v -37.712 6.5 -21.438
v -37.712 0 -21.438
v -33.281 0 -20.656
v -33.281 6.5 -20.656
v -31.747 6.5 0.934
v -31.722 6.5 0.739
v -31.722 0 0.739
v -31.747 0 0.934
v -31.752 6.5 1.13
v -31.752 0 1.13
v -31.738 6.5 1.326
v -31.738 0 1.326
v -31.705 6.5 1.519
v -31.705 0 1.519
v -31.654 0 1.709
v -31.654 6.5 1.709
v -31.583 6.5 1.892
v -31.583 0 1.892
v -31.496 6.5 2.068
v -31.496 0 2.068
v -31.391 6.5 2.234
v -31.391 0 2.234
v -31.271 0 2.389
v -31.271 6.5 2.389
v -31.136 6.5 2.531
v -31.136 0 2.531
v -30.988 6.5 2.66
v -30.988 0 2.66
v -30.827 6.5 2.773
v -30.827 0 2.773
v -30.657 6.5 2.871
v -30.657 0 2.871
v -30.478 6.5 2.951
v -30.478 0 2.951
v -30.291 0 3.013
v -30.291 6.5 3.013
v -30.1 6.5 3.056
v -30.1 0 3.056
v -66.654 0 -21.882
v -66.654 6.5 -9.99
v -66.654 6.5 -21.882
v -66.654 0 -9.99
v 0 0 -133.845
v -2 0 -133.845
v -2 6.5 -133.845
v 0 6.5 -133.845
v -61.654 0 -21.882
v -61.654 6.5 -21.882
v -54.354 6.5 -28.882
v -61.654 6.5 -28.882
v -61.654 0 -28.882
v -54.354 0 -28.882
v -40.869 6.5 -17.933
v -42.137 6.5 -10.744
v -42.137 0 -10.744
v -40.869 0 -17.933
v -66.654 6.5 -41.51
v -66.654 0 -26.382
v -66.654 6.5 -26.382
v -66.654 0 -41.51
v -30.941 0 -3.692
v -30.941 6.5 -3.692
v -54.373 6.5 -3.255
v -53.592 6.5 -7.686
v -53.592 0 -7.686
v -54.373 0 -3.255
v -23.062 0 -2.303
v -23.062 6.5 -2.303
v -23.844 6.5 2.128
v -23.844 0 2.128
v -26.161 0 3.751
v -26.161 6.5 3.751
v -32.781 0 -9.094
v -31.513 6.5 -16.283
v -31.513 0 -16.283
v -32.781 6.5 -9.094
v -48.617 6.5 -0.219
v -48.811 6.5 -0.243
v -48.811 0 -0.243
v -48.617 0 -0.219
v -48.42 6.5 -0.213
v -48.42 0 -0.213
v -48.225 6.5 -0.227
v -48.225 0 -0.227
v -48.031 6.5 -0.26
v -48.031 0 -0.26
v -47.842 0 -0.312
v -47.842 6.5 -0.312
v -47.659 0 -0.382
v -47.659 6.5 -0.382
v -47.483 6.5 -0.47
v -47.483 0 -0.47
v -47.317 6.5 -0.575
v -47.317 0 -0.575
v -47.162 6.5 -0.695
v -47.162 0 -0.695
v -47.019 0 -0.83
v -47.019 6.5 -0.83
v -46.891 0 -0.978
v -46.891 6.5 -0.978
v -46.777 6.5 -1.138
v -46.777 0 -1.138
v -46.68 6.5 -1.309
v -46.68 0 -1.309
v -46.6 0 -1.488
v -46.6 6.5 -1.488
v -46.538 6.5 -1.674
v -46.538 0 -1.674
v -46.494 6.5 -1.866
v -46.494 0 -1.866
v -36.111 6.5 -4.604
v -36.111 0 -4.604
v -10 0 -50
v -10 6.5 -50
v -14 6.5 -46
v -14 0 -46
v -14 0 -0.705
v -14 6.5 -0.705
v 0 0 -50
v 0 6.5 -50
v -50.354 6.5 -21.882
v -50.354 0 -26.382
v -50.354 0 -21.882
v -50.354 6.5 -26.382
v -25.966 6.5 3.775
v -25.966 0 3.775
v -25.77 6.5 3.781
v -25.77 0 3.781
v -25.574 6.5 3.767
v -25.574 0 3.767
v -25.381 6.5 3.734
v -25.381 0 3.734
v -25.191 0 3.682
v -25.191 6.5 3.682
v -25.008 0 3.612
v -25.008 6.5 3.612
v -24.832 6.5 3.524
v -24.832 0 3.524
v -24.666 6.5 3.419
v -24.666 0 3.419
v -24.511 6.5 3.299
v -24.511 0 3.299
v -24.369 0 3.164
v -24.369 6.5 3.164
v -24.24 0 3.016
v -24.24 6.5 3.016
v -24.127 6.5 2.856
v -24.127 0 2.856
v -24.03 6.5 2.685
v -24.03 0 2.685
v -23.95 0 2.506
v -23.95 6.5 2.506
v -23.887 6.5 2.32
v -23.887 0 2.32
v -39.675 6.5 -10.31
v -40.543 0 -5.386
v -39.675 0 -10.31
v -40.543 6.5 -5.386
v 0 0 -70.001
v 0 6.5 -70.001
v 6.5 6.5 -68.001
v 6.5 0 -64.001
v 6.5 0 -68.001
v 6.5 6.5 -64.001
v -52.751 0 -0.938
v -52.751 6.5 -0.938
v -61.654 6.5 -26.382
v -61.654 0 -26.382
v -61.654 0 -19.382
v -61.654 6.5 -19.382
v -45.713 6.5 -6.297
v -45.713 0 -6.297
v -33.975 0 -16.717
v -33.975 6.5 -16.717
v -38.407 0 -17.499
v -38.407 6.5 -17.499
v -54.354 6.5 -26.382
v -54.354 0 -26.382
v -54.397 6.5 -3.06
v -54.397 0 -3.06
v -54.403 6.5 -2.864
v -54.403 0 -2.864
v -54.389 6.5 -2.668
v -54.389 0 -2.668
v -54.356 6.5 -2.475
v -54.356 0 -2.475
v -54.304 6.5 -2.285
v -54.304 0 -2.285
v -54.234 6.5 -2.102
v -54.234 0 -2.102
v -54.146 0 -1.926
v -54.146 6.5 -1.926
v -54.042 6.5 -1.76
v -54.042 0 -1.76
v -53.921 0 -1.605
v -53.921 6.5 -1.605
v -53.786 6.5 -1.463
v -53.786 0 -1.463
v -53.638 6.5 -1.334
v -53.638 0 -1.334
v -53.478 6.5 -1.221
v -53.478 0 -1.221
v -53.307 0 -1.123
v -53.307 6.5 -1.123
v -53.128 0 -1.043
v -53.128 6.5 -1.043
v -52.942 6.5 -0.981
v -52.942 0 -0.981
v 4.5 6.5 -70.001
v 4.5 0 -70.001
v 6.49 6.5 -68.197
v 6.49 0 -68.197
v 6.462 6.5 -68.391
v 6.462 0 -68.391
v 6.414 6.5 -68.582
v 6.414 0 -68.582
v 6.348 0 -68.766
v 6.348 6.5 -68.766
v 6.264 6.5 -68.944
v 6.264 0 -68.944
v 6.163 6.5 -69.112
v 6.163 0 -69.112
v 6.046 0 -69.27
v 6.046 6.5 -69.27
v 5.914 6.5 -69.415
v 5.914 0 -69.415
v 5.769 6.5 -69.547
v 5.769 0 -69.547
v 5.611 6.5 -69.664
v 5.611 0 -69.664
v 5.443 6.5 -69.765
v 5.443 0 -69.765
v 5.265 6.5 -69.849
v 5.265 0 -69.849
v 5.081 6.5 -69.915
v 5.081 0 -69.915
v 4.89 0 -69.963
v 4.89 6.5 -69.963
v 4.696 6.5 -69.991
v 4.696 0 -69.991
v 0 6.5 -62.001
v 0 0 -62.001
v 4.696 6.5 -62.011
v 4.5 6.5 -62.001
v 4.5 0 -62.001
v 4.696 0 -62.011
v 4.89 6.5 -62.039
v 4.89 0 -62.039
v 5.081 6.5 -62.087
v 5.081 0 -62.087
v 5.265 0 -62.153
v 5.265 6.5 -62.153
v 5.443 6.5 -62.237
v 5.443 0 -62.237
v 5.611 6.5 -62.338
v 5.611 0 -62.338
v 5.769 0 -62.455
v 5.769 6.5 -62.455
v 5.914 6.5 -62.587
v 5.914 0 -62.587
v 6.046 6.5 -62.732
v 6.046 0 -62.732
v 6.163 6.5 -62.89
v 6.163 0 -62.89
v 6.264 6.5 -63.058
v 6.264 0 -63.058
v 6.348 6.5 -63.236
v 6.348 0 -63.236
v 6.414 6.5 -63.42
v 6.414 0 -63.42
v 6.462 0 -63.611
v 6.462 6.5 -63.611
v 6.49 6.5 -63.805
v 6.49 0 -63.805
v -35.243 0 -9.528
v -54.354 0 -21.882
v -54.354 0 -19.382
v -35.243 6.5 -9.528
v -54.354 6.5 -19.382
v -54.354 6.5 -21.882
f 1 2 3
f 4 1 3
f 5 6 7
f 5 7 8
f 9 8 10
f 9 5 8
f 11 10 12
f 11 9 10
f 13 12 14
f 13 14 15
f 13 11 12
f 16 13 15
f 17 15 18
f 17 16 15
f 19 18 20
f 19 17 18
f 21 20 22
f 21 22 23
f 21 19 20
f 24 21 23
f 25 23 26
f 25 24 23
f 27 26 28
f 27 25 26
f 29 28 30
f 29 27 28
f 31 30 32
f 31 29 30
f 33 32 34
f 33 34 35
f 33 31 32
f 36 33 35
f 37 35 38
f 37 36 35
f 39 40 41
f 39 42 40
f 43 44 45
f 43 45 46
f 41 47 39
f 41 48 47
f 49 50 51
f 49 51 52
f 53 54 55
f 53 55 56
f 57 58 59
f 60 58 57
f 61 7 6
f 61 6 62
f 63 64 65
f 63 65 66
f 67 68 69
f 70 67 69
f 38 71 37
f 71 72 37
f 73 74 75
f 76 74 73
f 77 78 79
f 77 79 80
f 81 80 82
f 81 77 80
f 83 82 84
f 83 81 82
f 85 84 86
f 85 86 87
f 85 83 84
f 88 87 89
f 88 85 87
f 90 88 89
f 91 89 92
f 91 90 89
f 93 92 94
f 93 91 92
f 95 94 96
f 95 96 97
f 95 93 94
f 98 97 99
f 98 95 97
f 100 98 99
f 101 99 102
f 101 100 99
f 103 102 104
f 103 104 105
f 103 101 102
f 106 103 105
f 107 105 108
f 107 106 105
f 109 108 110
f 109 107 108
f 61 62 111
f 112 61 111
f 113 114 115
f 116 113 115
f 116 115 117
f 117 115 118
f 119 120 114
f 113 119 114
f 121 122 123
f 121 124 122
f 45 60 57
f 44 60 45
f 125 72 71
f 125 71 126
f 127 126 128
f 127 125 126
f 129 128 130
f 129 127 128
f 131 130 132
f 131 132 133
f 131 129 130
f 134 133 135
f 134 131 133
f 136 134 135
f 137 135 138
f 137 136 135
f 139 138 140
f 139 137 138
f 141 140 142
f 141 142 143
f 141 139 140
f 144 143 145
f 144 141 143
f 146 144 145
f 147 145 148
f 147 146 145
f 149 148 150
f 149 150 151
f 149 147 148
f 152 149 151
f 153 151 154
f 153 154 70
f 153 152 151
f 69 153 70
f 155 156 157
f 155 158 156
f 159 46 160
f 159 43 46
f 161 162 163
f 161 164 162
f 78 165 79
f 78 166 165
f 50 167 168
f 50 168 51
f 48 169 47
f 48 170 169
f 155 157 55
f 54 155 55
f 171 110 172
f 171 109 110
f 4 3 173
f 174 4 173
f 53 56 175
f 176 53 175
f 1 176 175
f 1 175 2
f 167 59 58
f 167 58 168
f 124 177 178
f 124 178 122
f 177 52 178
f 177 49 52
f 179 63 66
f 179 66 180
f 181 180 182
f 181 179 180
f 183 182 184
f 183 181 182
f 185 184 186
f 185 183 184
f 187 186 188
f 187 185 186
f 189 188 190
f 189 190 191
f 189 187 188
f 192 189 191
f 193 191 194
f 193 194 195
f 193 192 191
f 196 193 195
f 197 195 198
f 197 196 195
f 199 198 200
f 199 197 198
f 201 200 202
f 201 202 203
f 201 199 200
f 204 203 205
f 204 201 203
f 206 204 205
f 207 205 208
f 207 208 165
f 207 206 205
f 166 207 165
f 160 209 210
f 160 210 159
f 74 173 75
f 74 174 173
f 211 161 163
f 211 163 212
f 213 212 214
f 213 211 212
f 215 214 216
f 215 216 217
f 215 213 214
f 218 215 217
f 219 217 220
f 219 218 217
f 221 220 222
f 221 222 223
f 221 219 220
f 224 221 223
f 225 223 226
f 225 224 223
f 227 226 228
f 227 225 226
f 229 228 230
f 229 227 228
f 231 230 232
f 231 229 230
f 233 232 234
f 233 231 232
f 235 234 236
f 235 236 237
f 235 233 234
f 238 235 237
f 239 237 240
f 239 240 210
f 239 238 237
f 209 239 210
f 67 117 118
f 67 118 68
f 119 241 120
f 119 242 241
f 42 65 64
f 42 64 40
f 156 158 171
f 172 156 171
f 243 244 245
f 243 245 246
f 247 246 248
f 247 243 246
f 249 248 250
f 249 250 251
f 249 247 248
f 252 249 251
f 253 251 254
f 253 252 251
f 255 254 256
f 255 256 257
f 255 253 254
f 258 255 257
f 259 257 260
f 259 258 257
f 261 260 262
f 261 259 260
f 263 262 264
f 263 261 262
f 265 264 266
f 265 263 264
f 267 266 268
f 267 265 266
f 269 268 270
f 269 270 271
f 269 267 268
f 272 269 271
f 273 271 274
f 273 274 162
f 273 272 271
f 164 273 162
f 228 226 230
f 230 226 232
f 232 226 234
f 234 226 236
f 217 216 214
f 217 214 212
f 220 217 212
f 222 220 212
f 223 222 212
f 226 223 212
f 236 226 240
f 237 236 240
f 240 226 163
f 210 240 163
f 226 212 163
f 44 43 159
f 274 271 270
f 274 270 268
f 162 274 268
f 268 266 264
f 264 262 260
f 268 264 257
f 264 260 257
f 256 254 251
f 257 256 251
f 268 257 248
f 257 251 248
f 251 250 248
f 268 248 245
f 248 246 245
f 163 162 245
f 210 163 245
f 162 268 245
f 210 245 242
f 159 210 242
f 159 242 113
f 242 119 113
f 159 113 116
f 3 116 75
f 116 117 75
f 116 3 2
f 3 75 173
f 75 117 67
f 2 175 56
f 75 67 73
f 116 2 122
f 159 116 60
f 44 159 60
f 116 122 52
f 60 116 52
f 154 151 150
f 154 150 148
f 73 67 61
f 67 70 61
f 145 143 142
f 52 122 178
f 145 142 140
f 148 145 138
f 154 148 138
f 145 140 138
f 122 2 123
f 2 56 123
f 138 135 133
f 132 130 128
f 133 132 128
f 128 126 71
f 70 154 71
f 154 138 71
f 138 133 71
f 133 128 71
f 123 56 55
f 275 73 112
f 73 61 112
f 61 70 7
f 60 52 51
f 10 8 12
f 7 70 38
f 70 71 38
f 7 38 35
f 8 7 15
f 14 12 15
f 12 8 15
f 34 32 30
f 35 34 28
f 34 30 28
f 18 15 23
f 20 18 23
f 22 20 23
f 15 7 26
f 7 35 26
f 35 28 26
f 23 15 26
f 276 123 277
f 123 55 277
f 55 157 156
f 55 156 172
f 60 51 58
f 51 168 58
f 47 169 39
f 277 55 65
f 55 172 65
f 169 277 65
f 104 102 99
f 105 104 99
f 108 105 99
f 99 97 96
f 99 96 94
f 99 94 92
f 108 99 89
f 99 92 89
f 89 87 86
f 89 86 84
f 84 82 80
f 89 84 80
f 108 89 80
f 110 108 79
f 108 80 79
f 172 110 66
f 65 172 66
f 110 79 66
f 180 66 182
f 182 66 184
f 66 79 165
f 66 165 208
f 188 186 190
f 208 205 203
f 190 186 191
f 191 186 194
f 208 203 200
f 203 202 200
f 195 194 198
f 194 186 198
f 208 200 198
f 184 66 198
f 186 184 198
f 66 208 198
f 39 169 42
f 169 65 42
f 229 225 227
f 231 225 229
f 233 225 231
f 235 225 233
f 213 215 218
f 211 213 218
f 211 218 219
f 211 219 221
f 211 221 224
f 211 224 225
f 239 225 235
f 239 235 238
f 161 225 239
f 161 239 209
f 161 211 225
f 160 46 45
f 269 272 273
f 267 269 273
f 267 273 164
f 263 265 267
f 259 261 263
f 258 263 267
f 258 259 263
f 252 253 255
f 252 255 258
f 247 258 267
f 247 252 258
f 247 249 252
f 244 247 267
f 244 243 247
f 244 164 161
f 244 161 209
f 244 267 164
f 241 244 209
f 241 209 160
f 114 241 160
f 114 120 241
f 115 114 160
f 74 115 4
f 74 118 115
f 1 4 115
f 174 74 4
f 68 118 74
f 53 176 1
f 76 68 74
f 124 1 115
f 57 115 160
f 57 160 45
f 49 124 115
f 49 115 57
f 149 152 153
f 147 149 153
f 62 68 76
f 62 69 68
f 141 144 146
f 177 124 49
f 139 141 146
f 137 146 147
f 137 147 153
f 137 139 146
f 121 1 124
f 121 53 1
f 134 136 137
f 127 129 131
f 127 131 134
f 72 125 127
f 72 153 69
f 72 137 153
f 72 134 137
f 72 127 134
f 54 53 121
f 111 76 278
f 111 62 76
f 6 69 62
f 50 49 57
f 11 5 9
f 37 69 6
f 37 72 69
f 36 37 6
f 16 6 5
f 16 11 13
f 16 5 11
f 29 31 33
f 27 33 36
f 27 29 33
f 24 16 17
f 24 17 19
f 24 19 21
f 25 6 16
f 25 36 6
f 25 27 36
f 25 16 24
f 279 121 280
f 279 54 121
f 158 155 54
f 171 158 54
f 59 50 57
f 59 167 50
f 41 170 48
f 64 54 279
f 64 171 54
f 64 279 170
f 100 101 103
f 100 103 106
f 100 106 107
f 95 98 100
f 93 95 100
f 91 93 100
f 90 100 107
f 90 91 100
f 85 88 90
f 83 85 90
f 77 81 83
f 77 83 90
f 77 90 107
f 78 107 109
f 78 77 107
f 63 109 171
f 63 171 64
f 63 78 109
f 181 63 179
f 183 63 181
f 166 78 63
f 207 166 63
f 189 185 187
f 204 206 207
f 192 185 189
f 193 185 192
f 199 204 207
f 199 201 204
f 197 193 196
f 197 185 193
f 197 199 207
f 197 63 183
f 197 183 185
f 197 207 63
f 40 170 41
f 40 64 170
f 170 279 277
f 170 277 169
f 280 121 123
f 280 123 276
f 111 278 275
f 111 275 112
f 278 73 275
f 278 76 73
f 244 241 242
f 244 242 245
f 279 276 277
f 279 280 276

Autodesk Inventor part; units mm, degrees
ref_plane "YZ Plane" through (0, 0, 0) normal (1, 0, 0) x (0, 1, 0)
ref_plane "XZ Plane" through (0, 0, 0) normal (0, 1, 0) x (-1, 0, 0)
ref_plane "XY Plane" through (0, 0, 0) normal (0, 0, 1) x (1, 0, 0)
sketch "Sketch1" plane through (0, 0, 0) normal (0, 1, 0) x (-1, 0, 0)
  line L0 (0, 0) -> (10, 0)
  line L1 (10, 0) -> (66.654, -9.9896)
  line L2 (66.654, -9.9896) -> (66.654, -41.5096)
  line L3 (66.654, -41.5096) -> (2, -133.8451)
  line L4 (2, -133.8451) -> (0, -133.8451)
  line L5 (0, -133.8451) -> (0, 0)
  dimension "d0" = 31.52
  dimension "d1" = 145
  dimension "d2" = 100
  dimension "d3" = 10
  dimension "d4" = 2
  dimension "d5" = 66.654
extrude "Extrusion1" add sketch "Sketch1" along normal blind 6.5
sketch "Sketch2" plane through (0, 6.5, 0) normal (0, 1, 0) x (1, 0, 0)
  line L0 (-66.654, 41.5096) -> (-66.654, 9.9896) projected
  line L1 (-66.654, 9.9896) -> (-10, 0) projected
  line L2 (-50.354, 26.3816) -> (-50.354, 21.8816)
  line L3 (-66.654, 21.8816) -> (-66.654, 26.3816)
  line L4 (-61.654, 28.8816) -> (-54.354, 28.8816)
  line L5 (-54.354, 19.3816) -> (-61.654, 19.3816)
  line L6 (-66.654, 26.3816) -> (-61.654, 26.3816)
  line L7 (-54.354, 26.3816) -> (-50.354, 26.3816)
  line L8 (-61.654, 19.3816) -> (-61.654, 21.8816)
  line L9 (-61.654, 26.3816) -> (-61.654, 28.8816)
  line L10 (-50.354, 21.8816) -> (-54.354, 21.8816)
  line L11 (-61.654, 21.8816) -> (-66.654, 21.8816)
  line L12 (-54.354, 28.8816) -> (-54.354, 26.3816)
  line L13 (-54.354, 21.8816) -> (-54.354, 19.3816)
  line L14 (-37.7124, 21.4379) -> (-33.2807, 20.6565)
  line L15 (-36.1112, 4.6041) -> (-40.5428, 5.3855)
  line L16 (-42.1366, 10.7437) -> (-40.869, 17.9328)
  line L17 (-31.5133, 16.2831) -> (-32.7809, 9.094)
  line L18 (-40.5428, 5.3855) -> (-39.6746, 10.3096)
  line L19 (-38.4069, 17.4987) -> (-37.7124, 21.4379)
  line L20 (-32.7809, 9.094) -> (-35.2429, 9.5281)
  line L21 (-39.6746, 10.3096) -> (-42.1366, 10.7437)
  line L22 (-33.2807, 20.6565) -> (-33.9753, 16.7172)
  line L23 (-35.2429, 9.5281) -> (-36.1112, 4.6041)
  line L24 (-40.869, 17.9328) -> (-38.4069, 17.4987)
  line L25 (-33.9753, 16.7172) -> (-31.5133, 16.2831)
  point P0 (-38.327, 4.9948)
  point P1 (-50.354, 24.1316)
  dimension "d8" = 4.5
  dimension "d9" = 5
  dimension "d10" = 4
  dimension "d11" = 7.3
  dimension "d12" = 2.5
  dimension "d13" = 4.5
  dimension "d14" = 5
  dimension "d15" = 4
  dimension "d16" = 7.3
  dimension "d17" = 2.5
  dimension "d35" = 14.142
extrude "Extrusion2" cut sketch "Sketch2" against normal through all
sketch "Sketch3" plane through (0, 6.5, 0) normal (0, 1, 0) x (1, 0, 0)
  line L0 (-66.654, 9.9896) -> (-40.5428, 5.3855) projected
  line L1 (-37.7124, 21.4379) -> (-33.2807, 20.6565) projected
  line L2 (-36.1112, 4.6041) -> (-10, 0) projected
  line L3 (-45.7131, 6.2972) -> (-53.5915, 7.6864)
  line L4 (-53.5915, 7.6864) -> (-54.3729, 3.2547)
  line L5 (-52.7506, 0.9378) -> (-48.8114, 0.2432)
  line L6 (-46.4945, 1.8655) -> (-45.7131, 6.2972)
  line L7 (-30.9409, 3.6925) -> (-23.0625, 2.3033)
  line L8 (-23.0625, 2.3033) -> (-23.8439, -2.1284)
  line L9 (-26.1608, -3.7507) -> (-30.1, -3.0561)
  line L10 (-31.7224, -0.7392) -> (-30.9409, 3.6925)
  arc A0 (-54.3729, 3.2547) -> (-52.7506, 0.9378) centre (-52.4033, 2.9074) ccw
  arc A1 (-48.8114, 0.2432) -> (-46.4945, 1.8655) centre (-48.4641, 2.2128) ccw
  arc A2 (-31.7224, -0.7392) -> (-30.1, -3.0561) centre (-29.7527, -1.0865) ccw
  arc A3 (-26.1608, -3.7507) -> (-23.8439, -2.1284) centre (-25.8135, -1.7811) ccw
  point P0 (-35.4965, 21.0472)
  dimension "d20" = 2
  dimension "d21" = 8
  dimension "d22" = 8
  dimension "d23" = 6.5
  dimension "d24" = 15
  dimension "d25" = 7.5
extrude "Extrusion3" add sketch "Sketch3" against normal blind 6.5
sketch "Sketch4" plane through (0, 6.5, 0) normal (0, 1, 0) x (1, 0, 0)
  line L0 (-23.0625, 2.3033) -> (-10, 0) projected
  line L1 (-10, 0) -> (0, 0) projected
  line L2 (0, 0) -> (0, 133.8451) projected
  line L3 (-61.654, 19.3816) -> (-61.654, 21.8816) projected
  line L4 (0, 50) -> (-10, 50)
  line L5 (-10, 50) -> (-14, 46)
  line L6 (-14, 46) -> (-14, 0.7053)
  dimension "d28" = 45
  dimension "d29" = 10
  dimension "d30" = 50
  dimension "d32" = 4
extrude "Extrusion4" cut sketch "Sketch4" against normal through all
sketch "Sketch5" plane through (0, 6.5, 0) normal (0, 1, 0) x (1, 0, 0)
  line L0 (0, 50) -> (0, 133.8451) projected
  line L1 (0, 62.001) -> (4.5, 62.001)
  line L2 (6.5, 64.001) -> (6.5, 68.001)
  line L3 (4.5, 70.001) -> (0, 70.001)
  line L4 (0, 70.001) -> (0, 62.001)
  arc A0 (4.5, 62.001) -> (6.5, 64.001) centre (4.5, 64.001) ccw
  arc A1 (6.5, 68.001) -> (4.5, 70.001) centre (4.5, 68.001) ccw
  point P0 (0, 0)
  dimension "d36" = 2
  dimension "d37" = 8
  dimension "d38" = 6.5
  dimension "d39" = 12.001
extrude "Extrusion5" add sketch "Sketch5" against normal blind 6.5
equation "\"d25\" = 0.5 * d24"
properties part number "front_panel_brace_middle" material "Plywood, Finish"
